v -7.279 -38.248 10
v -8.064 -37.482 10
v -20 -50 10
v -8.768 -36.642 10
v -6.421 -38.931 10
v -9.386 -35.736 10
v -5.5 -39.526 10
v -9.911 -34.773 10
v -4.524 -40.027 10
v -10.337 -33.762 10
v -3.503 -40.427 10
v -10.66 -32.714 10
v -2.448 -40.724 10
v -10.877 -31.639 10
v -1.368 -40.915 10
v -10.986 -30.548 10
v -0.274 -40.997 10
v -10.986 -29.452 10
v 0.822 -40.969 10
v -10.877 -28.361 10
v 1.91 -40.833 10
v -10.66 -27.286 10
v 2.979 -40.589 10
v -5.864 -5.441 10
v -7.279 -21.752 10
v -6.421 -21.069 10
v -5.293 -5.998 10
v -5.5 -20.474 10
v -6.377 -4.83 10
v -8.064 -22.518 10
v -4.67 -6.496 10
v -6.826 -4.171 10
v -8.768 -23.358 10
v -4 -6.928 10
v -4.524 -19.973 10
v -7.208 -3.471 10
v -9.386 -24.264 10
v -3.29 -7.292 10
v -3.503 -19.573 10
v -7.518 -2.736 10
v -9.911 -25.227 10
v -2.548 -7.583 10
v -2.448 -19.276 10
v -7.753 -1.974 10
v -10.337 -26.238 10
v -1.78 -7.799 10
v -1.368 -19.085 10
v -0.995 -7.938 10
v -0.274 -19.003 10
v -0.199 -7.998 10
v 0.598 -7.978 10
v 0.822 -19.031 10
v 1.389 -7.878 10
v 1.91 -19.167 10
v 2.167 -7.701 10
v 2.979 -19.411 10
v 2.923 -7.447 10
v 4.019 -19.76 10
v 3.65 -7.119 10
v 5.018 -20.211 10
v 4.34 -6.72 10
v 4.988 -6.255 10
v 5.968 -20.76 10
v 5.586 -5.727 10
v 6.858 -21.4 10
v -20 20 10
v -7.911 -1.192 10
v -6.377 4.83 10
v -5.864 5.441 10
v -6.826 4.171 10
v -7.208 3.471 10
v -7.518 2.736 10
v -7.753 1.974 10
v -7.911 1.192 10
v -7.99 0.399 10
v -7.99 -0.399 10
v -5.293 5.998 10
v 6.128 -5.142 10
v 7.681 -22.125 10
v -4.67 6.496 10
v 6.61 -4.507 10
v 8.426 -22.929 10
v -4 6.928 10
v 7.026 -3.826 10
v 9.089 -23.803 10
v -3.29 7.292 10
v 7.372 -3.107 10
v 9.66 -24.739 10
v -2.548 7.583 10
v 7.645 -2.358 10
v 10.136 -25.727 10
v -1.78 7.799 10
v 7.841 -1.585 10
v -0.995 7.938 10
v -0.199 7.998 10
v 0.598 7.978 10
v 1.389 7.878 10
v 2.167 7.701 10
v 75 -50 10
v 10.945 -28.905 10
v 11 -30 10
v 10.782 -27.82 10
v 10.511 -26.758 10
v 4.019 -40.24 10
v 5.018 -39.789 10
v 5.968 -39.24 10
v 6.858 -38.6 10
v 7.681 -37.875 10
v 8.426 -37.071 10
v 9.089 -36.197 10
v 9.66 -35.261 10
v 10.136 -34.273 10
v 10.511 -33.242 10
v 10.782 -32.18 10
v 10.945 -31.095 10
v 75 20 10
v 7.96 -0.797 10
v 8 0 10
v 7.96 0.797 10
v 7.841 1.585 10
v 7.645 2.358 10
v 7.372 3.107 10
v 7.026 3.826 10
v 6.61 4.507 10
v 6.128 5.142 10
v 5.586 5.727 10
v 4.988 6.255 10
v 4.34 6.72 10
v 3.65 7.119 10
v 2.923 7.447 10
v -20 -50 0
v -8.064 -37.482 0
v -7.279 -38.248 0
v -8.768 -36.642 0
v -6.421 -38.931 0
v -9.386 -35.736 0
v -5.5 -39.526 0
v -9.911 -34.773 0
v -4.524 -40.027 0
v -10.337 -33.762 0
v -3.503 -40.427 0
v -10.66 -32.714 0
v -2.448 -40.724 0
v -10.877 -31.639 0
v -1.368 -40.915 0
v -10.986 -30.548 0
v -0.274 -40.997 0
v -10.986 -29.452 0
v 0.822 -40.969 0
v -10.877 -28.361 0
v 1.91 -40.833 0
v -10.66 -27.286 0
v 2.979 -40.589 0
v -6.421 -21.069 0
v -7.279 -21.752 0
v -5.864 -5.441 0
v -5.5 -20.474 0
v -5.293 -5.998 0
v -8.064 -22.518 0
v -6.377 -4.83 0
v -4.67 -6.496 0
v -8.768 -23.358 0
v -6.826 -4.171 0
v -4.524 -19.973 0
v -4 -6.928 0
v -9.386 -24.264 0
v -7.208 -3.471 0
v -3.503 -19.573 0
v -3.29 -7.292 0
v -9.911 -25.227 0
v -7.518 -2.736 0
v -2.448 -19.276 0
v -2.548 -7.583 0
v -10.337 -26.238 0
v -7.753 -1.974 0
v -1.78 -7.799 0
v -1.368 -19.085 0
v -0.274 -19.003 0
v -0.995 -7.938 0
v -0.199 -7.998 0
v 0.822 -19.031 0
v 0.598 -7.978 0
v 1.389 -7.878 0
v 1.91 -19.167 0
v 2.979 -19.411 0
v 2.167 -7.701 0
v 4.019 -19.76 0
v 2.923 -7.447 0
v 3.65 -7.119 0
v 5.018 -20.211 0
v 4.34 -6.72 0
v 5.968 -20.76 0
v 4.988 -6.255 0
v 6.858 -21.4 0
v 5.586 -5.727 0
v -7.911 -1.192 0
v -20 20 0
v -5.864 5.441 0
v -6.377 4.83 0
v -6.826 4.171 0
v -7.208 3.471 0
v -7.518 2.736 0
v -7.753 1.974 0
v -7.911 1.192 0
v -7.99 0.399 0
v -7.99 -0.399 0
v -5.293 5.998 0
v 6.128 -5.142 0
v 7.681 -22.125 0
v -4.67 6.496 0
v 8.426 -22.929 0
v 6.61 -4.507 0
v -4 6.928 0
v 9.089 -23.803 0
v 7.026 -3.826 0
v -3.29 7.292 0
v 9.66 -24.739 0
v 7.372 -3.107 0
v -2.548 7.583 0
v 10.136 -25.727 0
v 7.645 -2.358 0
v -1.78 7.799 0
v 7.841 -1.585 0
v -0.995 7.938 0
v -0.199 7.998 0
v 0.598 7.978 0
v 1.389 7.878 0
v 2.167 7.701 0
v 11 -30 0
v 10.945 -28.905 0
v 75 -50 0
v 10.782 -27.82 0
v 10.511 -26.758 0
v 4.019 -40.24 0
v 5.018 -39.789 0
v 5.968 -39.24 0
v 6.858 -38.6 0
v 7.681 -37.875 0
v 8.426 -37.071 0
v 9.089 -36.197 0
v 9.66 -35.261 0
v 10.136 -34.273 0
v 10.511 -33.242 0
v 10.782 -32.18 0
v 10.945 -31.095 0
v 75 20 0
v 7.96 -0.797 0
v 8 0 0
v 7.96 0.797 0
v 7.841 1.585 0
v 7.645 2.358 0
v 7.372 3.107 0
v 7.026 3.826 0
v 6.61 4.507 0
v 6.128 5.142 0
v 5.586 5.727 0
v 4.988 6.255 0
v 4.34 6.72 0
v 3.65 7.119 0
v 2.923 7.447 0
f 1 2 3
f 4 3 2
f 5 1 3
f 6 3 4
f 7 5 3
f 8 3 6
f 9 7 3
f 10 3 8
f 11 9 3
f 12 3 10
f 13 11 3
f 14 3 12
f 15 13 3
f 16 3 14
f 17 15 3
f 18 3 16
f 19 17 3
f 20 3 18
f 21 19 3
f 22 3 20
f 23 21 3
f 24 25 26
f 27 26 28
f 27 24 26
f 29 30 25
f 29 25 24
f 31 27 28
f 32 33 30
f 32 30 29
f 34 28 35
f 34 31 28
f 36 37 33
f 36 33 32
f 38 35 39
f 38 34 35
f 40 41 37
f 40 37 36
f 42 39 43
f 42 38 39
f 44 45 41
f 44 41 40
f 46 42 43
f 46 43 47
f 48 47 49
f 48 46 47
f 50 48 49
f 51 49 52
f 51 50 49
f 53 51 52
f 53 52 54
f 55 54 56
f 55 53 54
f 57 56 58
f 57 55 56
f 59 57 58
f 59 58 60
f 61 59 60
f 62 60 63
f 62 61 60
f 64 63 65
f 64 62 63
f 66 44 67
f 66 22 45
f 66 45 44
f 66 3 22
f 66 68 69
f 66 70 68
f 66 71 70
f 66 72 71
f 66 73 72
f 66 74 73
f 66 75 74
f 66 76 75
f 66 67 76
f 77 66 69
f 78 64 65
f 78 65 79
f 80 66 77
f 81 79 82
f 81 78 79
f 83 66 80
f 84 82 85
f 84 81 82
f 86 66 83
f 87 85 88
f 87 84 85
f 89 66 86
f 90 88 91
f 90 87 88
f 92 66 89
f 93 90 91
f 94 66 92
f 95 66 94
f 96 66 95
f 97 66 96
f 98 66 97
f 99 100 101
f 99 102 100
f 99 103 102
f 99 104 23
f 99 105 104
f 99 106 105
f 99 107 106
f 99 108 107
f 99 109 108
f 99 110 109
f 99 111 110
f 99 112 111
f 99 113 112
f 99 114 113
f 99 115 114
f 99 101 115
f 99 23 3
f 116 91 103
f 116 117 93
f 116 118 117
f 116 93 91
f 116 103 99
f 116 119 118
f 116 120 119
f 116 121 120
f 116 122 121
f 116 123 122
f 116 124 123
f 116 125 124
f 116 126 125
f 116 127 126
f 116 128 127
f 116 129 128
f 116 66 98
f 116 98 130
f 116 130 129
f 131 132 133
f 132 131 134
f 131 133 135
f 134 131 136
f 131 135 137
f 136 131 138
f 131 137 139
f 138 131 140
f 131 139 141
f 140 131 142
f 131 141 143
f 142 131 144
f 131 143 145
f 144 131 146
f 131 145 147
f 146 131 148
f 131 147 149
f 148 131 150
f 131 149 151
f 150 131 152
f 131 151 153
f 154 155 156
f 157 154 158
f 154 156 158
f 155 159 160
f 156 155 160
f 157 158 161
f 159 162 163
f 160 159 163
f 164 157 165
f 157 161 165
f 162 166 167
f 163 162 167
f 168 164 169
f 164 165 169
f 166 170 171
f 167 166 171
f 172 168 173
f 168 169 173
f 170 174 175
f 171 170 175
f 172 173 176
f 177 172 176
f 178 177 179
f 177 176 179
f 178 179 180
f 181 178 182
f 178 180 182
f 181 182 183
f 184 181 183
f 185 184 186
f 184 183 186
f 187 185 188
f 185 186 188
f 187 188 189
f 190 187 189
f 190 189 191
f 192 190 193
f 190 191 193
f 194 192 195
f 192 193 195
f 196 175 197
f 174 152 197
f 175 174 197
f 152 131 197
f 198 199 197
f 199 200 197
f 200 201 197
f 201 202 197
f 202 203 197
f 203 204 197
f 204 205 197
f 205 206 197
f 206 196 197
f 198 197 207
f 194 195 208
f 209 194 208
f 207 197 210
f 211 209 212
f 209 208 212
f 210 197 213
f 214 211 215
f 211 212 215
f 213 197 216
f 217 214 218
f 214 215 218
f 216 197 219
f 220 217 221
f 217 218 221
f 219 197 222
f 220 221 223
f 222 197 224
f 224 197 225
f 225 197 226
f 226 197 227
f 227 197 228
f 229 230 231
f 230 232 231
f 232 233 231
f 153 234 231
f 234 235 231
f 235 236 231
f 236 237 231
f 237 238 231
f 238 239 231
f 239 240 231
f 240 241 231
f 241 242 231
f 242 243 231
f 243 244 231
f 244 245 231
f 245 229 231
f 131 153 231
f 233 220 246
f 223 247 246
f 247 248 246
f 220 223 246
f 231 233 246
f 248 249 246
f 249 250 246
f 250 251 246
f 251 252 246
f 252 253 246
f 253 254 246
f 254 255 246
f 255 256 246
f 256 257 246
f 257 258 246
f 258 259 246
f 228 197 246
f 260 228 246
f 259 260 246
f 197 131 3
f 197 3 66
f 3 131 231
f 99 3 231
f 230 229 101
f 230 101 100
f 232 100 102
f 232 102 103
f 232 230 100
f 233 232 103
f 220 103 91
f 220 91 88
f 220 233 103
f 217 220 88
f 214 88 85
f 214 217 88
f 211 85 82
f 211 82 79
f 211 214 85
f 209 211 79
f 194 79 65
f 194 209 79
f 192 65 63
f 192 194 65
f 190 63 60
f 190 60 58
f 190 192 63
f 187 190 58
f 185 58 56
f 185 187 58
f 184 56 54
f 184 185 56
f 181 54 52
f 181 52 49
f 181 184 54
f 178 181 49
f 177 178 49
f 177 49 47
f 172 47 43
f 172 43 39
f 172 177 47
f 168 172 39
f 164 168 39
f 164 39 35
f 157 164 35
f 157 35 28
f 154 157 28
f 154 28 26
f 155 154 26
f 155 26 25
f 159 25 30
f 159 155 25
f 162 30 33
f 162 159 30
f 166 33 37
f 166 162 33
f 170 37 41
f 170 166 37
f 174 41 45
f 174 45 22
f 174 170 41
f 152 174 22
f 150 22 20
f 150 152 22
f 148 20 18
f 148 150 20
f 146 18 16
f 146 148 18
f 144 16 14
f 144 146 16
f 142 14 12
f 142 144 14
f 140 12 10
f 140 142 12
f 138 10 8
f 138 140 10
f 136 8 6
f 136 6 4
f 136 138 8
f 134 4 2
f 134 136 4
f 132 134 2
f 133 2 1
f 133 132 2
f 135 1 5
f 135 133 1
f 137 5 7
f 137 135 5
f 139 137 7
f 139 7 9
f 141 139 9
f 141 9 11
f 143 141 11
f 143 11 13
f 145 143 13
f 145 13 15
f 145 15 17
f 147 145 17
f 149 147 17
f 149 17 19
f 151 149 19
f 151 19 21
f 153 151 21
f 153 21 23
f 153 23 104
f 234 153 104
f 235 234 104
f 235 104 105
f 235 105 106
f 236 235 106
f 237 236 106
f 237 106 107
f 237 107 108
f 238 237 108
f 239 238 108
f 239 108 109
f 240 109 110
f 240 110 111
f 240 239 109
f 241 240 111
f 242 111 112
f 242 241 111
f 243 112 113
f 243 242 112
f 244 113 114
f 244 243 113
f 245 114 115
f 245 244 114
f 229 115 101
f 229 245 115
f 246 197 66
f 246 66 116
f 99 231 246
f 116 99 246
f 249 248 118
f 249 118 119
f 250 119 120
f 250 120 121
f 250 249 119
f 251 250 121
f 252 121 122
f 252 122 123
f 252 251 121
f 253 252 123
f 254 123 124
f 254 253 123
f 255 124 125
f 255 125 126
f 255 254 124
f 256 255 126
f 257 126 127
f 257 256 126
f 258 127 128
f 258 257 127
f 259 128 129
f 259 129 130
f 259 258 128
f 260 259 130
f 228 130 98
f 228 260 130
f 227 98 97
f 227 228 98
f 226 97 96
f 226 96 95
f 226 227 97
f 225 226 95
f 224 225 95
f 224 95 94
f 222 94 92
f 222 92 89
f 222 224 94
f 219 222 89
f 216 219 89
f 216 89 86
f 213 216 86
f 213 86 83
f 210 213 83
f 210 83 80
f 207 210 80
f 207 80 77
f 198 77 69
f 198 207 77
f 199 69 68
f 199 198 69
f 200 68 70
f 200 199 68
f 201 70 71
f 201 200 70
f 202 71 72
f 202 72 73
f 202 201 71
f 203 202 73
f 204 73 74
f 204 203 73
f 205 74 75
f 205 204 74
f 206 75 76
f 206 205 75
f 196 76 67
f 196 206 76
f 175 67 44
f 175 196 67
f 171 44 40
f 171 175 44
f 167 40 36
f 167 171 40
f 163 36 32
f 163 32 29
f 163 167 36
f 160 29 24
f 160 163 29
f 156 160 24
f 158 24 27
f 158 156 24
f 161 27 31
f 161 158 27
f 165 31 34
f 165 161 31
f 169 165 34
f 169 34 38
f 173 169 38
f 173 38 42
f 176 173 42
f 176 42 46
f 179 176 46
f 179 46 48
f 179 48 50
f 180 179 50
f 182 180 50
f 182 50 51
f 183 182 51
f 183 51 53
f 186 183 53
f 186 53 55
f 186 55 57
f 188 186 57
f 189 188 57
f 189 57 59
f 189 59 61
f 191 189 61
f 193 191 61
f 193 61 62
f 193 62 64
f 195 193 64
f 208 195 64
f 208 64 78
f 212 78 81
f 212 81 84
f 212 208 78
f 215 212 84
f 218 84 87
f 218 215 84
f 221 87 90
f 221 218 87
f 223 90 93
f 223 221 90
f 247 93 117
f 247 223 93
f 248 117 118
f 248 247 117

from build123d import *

# Parameters (mm, degrees)
SKETCH_W   = 95
SKETCH_H   = 70
SKETCH_R   = 8
SKETCH_R_2 = 11
PAD_DEPTH  = 10


with BuildPart() as part:
    # Sketch → Pad (new body)
    with BuildSketch(Plane.XY):
        with Locations((27.5, -15)):
            Rectangle(SKETCH_W, SKETCH_H)
        Circle(SKETCH_R, mode=Mode.SUBTRACT)
        with Locations((0, -30)):
            Circle(SKETCH_R_2, mode=Mode.SUBTRACT)
    extrude(amount=PAD_DEPTH)


solid = part.part
